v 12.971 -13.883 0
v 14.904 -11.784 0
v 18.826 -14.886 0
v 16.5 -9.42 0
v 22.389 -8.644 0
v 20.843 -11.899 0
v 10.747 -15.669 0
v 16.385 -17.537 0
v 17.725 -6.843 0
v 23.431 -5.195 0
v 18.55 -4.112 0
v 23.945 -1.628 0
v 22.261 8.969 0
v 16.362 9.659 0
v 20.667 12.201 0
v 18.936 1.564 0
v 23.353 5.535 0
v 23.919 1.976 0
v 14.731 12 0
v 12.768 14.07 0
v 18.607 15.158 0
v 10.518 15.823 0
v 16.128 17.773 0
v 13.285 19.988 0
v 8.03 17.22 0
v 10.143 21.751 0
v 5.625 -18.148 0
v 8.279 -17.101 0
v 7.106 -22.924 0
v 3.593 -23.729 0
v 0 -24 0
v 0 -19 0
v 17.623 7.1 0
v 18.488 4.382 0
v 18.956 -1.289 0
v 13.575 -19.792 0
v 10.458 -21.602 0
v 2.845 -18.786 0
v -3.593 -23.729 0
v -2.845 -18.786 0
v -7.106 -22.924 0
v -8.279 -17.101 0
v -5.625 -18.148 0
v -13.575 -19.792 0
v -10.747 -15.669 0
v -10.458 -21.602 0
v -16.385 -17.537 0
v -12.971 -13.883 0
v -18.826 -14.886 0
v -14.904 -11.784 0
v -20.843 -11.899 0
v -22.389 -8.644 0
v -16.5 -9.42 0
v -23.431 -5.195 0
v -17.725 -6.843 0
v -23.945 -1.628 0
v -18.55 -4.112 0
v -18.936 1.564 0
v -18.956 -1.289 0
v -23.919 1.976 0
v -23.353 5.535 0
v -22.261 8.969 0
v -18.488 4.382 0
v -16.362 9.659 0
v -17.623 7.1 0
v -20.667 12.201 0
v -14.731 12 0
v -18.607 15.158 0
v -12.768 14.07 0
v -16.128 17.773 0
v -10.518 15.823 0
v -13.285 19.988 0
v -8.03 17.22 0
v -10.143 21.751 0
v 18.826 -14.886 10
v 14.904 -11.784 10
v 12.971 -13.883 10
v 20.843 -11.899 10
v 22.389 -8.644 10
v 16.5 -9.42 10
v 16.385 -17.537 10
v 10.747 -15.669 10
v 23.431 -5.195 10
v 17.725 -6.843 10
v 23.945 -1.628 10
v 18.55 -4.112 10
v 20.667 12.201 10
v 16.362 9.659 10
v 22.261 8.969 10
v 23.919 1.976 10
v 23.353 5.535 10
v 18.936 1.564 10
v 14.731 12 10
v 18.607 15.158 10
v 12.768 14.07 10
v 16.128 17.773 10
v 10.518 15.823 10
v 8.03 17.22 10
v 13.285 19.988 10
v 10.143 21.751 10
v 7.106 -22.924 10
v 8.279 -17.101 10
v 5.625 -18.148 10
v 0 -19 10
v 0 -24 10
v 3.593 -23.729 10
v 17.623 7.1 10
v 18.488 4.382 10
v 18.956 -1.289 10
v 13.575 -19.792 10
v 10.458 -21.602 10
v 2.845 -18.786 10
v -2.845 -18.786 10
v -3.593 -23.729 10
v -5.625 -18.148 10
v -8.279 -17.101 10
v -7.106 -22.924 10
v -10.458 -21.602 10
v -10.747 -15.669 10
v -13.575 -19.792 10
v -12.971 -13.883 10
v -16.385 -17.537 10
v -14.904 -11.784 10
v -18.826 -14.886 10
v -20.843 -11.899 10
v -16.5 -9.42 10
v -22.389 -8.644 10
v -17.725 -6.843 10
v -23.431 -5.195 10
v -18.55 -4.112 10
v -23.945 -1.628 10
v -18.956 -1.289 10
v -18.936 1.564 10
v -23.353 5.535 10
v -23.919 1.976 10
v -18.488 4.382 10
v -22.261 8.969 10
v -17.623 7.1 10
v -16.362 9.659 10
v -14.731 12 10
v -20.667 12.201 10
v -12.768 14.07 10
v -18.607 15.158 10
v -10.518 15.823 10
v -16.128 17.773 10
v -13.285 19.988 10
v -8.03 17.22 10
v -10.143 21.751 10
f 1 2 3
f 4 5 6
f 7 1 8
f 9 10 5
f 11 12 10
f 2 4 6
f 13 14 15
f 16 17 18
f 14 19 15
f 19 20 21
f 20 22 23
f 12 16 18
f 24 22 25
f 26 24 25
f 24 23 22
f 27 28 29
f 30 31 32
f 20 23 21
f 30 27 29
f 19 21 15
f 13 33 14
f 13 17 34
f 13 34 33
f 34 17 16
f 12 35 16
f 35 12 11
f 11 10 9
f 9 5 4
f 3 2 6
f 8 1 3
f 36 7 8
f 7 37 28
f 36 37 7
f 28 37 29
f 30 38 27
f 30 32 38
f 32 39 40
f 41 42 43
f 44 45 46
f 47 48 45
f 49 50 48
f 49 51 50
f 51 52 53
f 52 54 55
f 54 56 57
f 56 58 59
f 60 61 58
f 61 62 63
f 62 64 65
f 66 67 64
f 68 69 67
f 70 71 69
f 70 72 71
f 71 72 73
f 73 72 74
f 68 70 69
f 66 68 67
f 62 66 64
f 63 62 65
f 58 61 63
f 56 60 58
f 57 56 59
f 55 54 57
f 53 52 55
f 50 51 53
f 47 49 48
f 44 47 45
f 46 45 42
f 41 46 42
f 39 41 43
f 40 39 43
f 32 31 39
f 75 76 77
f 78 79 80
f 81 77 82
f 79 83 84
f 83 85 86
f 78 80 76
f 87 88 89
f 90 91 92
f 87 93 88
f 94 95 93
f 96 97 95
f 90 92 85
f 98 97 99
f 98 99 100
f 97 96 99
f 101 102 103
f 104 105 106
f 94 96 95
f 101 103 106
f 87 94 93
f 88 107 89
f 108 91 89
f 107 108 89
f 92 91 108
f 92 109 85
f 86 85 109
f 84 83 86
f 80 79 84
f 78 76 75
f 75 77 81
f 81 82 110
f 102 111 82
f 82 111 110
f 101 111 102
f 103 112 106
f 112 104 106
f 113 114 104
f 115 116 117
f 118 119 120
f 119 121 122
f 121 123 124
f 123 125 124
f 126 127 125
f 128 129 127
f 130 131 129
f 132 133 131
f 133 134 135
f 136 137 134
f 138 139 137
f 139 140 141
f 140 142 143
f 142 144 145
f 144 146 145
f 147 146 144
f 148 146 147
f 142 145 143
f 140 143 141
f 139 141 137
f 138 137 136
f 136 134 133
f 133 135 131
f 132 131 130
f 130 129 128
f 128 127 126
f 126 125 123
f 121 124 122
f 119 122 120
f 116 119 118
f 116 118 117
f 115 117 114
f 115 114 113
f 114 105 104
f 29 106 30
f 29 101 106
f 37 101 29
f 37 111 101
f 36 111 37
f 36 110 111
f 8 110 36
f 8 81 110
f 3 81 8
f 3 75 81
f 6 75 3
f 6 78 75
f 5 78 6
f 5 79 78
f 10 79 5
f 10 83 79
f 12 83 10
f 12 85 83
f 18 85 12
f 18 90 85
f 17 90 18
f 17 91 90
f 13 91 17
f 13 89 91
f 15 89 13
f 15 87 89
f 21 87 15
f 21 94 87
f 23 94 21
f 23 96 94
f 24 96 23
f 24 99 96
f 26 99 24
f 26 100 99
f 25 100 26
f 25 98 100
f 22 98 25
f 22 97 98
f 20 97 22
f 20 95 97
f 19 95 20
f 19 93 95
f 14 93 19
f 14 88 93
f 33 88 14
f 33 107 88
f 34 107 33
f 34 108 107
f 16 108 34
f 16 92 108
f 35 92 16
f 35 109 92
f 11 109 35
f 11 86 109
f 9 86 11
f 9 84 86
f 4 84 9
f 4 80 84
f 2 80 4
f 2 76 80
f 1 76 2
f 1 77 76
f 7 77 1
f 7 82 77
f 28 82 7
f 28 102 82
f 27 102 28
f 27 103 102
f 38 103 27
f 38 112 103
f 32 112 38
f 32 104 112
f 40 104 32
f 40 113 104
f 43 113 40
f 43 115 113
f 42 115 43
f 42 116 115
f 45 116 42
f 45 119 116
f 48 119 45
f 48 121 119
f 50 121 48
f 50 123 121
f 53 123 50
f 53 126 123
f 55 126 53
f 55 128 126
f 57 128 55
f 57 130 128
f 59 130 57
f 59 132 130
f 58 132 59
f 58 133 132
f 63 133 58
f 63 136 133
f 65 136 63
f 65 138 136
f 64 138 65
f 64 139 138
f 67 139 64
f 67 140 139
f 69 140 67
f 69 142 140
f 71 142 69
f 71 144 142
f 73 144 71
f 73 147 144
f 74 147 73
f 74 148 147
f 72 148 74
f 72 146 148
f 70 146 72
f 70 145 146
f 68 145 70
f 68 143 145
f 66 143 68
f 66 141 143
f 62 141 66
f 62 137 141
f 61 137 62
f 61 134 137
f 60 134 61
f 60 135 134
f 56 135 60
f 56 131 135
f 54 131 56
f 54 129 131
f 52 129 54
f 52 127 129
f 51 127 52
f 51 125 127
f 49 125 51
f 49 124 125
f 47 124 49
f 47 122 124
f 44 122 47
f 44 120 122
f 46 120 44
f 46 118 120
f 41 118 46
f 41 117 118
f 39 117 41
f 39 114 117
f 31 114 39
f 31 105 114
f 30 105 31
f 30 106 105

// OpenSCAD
$fn = 32;

// ----------------------------------------------------------------------
// Spring clip: 48 mm outside, 5 mm band, 50 degree opening
// ----------------------------------------------------------------------

// --- parameters (mm) ---
outer_r = 24;             // clip outside radius
inner_r = 19;             // clip bore radius
band = 5;                 // band thickness
clip_w = 10;              // clip width
opening = 50;             // opening angle

clip_profile = [[-10.143, 21.751], [-13.285, 19.988], [-16.128, 17.773], [-18.607, 15.158], [-20.667, 12.201], [-22.261, 8.969], [-23.353, 5.535], [-23.919, 1.976], [-23.945, -1.628], [-23.431, -5.195], [-22.389, -8.644], [-20.843, -11.899], [-18.826, -14.886], [-16.385, -17.537], [-13.575, -19.792], [-10.458, -21.602], [-7.106, -22.924], [-3.593, -23.729], [0, -24], [3.593, -23.729], [7.106, -22.924], [10.458, -21.602], [13.575, -19.792], [16.385, -17.537], [18.826, -14.886], [20.843, -11.899], [22.389, -8.644], [23.431, -5.195], [23.945, -1.628], [23.919, 1.976], [23.353, 5.535], [22.261, 8.969], [20.667, 12.201], [18.607, 15.158], [16.128, 17.773], [13.285, 19.988], [10.143, 21.751], [8.03, 17.22], [10.518, 15.823], [12.768, 14.07], [14.731, 12], [16.362, 9.659], [17.623, 7.1], [18.488, 4.382], [18.936, 1.564], [18.956, -1.289], [18.55, -4.112], [17.725, -6.843], [16.5, -9.42], [14.904, -11.784], [12.971, -13.883], [10.747, -15.669], [8.279, -17.101], [5.625, -18.148], [2.845, -18.786], [0, -19], [-2.845, -18.786], [-5.625, -18.148], [-8.279, -17.101], [-10.747, -15.669], [-12.971, -13.883], [-14.904, -11.784], [-16.5, -9.42], [-17.725, -6.843], [-18.55, -4.112], [-18.956, -1.289], [-18.936, 1.564], [-18.488, 4.382], [-17.623, 7.1], [-16.362, 9.659], [-14.731, 12], [-12.768, 14.07], [-10.518, 15.823], [-8.03, 17.22]];

difference() {
  union() {
    linear_extrude(height = clip_w) polygon(clip_profile);
  }
}
